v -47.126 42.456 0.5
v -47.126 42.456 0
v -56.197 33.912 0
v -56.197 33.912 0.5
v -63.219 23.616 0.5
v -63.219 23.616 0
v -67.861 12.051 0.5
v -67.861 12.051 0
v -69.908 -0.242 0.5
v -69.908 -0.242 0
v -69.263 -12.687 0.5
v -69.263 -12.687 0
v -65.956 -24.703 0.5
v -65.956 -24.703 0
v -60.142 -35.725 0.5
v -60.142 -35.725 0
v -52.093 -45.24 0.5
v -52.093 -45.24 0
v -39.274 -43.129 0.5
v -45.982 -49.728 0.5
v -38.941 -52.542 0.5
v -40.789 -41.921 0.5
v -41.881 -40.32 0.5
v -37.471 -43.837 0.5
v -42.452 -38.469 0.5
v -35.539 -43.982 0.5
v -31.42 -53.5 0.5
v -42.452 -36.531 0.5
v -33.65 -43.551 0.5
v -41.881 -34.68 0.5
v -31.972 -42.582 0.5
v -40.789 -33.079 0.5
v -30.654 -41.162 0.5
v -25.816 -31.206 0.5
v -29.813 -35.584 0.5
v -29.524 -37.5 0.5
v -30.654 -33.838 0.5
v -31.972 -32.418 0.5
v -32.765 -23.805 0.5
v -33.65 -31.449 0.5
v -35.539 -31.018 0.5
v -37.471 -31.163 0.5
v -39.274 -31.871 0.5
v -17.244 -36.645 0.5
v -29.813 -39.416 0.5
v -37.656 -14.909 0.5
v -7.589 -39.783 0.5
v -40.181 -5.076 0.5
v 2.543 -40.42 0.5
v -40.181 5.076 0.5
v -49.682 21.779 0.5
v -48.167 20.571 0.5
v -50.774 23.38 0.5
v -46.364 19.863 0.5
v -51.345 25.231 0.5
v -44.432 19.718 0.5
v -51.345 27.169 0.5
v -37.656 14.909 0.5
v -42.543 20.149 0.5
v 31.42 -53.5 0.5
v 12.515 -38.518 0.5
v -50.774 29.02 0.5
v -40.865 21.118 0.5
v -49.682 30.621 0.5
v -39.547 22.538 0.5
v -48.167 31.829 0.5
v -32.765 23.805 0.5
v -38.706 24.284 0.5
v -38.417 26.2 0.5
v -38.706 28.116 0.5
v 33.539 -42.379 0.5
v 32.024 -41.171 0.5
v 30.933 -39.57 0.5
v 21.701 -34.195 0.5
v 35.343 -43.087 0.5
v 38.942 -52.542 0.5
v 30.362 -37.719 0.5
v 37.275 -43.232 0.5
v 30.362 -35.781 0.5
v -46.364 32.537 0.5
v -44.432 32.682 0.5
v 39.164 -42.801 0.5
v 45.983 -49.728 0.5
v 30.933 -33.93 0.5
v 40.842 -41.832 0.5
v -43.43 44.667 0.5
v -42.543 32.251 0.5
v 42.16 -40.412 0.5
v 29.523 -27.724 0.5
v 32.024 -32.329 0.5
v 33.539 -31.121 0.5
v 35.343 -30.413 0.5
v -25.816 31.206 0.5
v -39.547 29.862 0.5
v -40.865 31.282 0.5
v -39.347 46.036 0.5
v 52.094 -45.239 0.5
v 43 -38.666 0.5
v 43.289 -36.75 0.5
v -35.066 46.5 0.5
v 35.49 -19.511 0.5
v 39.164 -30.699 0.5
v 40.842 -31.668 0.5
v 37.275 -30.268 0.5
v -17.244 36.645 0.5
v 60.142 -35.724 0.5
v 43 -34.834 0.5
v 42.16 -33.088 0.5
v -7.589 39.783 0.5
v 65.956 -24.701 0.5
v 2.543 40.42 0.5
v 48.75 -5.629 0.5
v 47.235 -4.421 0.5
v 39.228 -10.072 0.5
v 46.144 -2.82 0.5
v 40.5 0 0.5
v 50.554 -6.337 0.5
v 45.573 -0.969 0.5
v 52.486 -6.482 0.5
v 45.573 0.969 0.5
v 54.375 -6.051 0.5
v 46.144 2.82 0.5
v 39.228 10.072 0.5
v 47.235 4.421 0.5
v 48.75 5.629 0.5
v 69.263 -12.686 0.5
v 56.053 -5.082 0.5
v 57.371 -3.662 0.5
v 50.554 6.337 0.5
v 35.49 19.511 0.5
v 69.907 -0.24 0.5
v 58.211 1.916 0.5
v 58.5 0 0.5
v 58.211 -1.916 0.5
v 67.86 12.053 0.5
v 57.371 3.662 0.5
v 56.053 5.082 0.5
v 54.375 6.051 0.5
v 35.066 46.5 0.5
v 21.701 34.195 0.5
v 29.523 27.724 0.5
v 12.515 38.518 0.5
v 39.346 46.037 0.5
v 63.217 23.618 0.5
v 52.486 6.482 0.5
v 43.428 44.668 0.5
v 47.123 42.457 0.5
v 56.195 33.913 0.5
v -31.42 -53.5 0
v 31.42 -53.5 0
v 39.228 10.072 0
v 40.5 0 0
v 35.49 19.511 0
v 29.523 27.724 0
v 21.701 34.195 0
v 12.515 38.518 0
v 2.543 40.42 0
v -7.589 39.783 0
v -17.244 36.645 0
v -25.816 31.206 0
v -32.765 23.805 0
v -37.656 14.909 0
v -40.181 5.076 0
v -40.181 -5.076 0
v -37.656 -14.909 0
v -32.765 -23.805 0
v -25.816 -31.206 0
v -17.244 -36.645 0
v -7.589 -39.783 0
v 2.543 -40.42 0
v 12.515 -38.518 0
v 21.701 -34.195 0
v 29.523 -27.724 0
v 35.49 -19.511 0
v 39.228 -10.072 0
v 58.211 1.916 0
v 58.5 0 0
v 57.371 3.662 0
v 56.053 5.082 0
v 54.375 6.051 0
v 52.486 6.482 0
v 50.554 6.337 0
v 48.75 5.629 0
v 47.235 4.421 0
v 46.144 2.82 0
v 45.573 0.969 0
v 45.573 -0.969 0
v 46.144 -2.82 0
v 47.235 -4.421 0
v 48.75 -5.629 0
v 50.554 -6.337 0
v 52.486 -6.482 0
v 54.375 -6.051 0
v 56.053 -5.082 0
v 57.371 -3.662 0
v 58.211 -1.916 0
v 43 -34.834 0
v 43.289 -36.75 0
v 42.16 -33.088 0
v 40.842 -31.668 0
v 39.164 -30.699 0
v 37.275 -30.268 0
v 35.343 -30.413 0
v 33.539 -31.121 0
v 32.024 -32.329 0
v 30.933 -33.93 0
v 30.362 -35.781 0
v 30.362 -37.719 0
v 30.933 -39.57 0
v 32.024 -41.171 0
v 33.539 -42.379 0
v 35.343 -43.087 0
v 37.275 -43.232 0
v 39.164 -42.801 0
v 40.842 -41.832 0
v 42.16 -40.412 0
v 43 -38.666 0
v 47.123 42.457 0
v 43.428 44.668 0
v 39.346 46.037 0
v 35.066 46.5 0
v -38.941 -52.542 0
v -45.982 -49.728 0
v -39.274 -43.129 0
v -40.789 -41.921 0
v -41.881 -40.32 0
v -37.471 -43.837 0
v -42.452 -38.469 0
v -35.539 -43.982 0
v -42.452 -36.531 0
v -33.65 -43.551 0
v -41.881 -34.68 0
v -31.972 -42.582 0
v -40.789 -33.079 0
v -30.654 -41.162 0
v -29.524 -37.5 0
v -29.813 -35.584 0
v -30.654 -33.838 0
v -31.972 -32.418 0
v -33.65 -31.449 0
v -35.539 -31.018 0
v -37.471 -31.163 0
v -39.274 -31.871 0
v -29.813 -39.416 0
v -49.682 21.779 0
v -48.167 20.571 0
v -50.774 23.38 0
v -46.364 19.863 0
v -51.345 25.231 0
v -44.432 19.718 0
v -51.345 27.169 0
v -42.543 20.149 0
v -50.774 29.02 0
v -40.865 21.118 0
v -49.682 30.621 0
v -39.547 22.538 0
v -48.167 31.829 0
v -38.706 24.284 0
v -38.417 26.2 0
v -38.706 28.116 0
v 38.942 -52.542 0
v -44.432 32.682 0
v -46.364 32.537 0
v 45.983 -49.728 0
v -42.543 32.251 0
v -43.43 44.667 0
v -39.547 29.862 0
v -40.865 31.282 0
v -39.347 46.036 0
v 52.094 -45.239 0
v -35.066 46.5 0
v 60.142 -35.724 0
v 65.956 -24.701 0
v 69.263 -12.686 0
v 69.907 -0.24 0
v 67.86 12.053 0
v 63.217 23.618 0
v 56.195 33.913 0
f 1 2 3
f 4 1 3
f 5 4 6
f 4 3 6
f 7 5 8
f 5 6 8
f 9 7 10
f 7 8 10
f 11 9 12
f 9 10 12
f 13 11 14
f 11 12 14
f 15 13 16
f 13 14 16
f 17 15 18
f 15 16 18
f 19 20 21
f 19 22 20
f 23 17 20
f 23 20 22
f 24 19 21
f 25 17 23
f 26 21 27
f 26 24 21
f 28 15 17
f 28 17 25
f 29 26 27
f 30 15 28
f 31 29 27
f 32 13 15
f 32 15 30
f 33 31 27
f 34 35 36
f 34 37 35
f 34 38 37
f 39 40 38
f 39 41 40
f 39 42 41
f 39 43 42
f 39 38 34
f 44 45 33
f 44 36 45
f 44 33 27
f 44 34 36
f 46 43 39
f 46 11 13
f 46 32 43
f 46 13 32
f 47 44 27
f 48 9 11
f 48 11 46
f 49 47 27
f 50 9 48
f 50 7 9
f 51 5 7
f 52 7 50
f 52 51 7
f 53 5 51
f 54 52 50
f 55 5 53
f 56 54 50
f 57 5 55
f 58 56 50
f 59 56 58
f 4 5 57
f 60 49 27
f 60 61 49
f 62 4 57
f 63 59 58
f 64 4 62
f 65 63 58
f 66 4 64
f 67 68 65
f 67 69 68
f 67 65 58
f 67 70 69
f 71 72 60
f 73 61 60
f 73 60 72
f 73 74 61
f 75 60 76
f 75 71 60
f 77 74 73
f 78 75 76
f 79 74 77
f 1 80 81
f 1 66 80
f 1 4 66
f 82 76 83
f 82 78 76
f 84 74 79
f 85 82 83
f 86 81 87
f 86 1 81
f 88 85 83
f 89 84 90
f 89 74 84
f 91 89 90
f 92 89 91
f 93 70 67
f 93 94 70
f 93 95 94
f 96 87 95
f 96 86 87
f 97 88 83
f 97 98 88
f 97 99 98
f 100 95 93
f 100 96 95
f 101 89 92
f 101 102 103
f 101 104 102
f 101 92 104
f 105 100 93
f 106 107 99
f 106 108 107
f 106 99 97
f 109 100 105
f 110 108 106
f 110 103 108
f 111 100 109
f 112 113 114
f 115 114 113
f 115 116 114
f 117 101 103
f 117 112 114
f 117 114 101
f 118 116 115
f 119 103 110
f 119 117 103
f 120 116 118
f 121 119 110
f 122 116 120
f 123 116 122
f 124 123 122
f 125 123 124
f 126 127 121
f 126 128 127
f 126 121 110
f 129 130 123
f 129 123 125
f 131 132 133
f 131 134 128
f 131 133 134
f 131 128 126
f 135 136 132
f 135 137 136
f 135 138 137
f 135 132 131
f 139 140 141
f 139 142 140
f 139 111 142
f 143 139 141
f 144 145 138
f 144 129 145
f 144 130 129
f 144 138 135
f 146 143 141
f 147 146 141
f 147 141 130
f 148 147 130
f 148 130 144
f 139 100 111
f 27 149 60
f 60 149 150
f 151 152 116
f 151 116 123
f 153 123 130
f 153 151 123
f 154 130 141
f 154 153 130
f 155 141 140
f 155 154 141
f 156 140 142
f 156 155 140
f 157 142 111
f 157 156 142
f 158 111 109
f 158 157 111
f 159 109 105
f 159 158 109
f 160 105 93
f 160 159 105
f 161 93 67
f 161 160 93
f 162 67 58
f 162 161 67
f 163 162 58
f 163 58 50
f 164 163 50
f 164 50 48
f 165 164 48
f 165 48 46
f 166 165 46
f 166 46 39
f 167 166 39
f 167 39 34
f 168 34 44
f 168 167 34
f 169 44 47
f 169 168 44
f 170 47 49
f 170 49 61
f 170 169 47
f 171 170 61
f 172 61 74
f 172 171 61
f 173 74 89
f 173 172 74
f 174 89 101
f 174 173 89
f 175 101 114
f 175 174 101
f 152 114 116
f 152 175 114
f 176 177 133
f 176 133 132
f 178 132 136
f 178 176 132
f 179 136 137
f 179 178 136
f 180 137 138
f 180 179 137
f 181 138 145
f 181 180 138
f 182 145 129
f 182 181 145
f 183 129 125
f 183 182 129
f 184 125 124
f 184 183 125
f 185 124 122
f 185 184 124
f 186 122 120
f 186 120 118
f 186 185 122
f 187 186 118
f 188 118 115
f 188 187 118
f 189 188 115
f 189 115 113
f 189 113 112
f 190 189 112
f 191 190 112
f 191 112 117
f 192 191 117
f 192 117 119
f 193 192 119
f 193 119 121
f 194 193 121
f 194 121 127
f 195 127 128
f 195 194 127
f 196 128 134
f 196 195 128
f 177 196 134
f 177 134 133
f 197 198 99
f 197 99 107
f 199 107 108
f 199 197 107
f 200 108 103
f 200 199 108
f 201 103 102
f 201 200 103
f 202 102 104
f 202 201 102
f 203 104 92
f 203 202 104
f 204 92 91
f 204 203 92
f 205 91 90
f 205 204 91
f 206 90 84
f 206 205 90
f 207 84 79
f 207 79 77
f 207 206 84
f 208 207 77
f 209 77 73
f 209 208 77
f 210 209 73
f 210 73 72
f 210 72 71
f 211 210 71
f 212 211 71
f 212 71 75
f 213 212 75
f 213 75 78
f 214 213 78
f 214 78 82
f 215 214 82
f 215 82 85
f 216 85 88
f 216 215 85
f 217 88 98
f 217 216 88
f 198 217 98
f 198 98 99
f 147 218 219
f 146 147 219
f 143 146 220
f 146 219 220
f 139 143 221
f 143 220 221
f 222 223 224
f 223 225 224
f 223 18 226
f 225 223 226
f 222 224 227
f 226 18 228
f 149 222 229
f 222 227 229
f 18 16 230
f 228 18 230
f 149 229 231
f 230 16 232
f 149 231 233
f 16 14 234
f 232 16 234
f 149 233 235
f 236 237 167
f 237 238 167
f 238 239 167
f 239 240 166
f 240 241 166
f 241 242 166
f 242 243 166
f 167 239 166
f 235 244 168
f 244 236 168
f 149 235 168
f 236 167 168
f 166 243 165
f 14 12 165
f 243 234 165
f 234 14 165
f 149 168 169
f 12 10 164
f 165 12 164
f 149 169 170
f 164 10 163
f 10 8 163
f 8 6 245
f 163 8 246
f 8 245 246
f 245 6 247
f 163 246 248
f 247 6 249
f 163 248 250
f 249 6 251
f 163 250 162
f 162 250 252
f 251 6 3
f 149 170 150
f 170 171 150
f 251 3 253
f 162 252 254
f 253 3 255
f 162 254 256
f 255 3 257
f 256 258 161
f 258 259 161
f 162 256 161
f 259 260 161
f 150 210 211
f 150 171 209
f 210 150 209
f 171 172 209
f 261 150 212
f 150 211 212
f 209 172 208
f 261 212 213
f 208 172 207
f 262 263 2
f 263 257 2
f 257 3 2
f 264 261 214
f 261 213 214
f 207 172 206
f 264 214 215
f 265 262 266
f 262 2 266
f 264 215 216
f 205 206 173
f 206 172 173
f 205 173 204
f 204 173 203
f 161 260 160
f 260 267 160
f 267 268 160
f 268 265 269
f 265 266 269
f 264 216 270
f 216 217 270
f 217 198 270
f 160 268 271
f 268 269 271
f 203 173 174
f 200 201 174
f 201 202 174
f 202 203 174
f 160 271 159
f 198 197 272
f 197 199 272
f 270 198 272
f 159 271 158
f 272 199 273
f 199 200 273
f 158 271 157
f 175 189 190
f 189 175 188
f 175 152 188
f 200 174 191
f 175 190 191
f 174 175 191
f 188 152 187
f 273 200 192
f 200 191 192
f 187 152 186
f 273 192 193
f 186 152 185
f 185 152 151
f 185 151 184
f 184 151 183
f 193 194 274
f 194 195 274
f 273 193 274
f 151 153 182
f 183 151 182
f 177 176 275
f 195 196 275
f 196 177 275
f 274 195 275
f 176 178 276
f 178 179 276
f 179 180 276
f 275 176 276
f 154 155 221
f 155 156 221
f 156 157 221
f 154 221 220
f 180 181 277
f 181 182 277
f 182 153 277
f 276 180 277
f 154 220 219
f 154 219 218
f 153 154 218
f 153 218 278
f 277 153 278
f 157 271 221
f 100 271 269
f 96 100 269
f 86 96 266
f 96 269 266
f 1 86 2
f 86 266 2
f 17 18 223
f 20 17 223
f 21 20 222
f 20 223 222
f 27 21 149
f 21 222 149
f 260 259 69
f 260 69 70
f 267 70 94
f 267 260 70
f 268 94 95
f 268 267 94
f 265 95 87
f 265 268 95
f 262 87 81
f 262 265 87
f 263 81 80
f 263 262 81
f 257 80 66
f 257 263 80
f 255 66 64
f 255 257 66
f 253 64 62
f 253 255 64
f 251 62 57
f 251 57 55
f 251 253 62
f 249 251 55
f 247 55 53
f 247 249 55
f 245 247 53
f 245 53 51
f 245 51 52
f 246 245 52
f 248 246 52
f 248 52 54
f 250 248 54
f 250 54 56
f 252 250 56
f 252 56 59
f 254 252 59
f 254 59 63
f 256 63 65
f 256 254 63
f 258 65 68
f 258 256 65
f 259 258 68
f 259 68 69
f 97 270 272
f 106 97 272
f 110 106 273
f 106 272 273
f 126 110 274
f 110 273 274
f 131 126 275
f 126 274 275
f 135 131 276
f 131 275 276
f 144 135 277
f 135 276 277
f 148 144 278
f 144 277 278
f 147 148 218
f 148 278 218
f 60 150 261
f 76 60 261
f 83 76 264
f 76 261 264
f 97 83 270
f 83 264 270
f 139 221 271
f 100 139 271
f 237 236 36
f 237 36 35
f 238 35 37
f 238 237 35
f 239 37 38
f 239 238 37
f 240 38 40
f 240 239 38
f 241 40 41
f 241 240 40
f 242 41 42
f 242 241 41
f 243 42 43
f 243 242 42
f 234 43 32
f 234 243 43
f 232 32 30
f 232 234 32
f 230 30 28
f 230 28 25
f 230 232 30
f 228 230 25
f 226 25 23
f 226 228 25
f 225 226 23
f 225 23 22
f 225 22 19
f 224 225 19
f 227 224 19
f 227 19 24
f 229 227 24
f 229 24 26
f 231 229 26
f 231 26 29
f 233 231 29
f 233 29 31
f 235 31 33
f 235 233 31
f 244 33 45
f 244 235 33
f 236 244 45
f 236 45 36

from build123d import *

# Parameters (mm, degrees)
SKETCH1_R      = 40.5
SKETCH1_R_2    = 6.5
EXTRUDE1_DEPTH = 0.5


with BuildPart() as part:
    # Sketch1 → Extrude1 (new body)
    with BuildSketch(Plane.XY):
        with BuildLine():
            Line((-31.419788217, -53.5000001), (31.419788217, -53.5000001))
            ThreePointArc((31.419788217, -53.5000001), (42.551411722, -51.358337419), (52.093689717, -45.239130643))
            ThreePointArc((52.093689717, -45.239130643), (69.907481155, -0.240172639), (47.122602539, 42.457446655))
            ThreePointArc((47.122602539, 42.457446655), (41.424181091, 45.462448781), (35.066073476, 46.4999999))
            Line((35.066073476, 46.4999999), (-35.066073476, 46.4999999))
            ThreePointArc((-35.066073476, 46.4999999), (-41.425769339, 45.462104521), (-47.125508858, 42.456122536))
            ThreePointArc((-47.125508858, 42.456122536), (-69.908118584, -0.241920052), (-52.093134412, -45.239658724))
            ThreePointArc((-52.093134412, -45.239658724), (-42.551055918, -51.358479588), (-31.419788217, -53.5000001))
        make_face()
        Circle(SKETCH1_R, mode=Mode.SUBTRACT)
        with Locations((-44.917257263, 26.2)):
            Circle(SKETCH1_R_2, mode=Mode.SUBTRACT)
        with Locations((-36.024297356, -37.5)):
            Circle(SKETCH1_R_2, mode=Mode.SUBTRACT)
        with Locations((36.789094852, -36.75)):
            Circle(SKETCH1_R_2, mode=Mode.SUBTRACT)
        with Locations((52, 0)):
            Circle(SKETCH1_R_2, mode=Mode.SUBTRACT)
    extrude(amount=EXTRUDE1_DEPTH)


solid = part.part
